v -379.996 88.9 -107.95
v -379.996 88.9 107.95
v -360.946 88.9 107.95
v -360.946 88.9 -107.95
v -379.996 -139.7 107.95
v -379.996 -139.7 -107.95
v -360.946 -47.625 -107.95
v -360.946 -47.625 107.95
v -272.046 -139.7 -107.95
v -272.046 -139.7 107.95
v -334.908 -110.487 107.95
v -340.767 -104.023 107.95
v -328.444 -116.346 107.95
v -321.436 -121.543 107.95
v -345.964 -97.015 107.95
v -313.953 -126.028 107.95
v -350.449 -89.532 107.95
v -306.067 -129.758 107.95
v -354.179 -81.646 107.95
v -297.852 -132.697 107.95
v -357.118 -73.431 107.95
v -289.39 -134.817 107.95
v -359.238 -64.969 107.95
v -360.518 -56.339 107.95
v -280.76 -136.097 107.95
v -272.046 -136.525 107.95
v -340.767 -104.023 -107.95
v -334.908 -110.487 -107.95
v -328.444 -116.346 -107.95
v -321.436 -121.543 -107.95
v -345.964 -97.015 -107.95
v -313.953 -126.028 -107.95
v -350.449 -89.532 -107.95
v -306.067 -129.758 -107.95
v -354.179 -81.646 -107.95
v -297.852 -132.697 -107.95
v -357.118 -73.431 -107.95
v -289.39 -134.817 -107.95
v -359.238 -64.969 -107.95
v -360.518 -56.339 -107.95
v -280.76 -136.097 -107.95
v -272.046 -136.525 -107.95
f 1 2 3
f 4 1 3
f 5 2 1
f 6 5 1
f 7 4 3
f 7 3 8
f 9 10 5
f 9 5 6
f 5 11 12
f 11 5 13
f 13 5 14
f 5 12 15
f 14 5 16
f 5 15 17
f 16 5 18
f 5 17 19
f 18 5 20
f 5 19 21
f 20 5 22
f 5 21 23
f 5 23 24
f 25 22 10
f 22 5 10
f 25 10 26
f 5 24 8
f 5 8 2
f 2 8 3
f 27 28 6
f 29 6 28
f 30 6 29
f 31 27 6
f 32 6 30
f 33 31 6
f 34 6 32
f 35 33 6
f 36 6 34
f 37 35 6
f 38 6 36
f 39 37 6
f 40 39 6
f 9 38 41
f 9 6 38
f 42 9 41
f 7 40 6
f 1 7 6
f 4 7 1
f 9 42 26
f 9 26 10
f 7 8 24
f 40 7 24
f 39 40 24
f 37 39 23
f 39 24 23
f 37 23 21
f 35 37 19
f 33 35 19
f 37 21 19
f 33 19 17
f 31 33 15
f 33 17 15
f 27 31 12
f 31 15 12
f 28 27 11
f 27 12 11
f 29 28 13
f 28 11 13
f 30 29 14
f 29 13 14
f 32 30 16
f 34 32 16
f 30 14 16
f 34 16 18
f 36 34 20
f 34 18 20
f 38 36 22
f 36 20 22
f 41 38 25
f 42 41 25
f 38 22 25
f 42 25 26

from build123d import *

# Parameters (mm, degrees)
SKETCH1_W           = 215.9
SKETCH1_H           = 279.4
BOSS_EXTRUDE1_DEPTH = 63.5
CUT_EXTRUDE2_DEPTH  = 216.9


with BuildPart() as part:
    # Sketch1 → Boss-Extrude1 (new body, symmetric)
    with BuildSketch(Plane(origin=(-316.495998982, -92.239904424, -225.371199256), x_dir=(0, 0, -1), z_dir=(1, 0, 0))):
        with Locations((-225.371199256, 92.239904424)):
            Rectangle(SKETCH1_W, SKETCH1_H)
    extrude(amount=BOSS_EXTRUDE1_DEPTH, both=True)

    # Sketch2 → Cut-Extrude2 (cut, through all)
    with BuildSketch(Plane.XY.offset(107.95)):
        with BuildLine():
            Line((-272.045998982, -139.7), (-252.995998982, -139.7))
            Line((-252.995998982, -139.7), (-252.995998982, 139.7))
            Line((-252.995998982, 139.7), (-379.995998982, 139.7))
            Line((-379.995998982, 139.7), (-379.995998982, 88.9))
            Line((-379.995998982, 88.9), (-360.945998982, 88.9))
            Line((-360.945998982, 88.9), (-360.945998982, -47.625))
            ThreePointArc((-360.945998982, -47.625), (-334.90779183, -110.486792847), (-272.045998982, -136.525))
            Line((-272.045998982, -136.525), (-272.045998982, -139.7))
        make_face()
    extrude(amount=-CUT_EXTRUDE2_DEPTH, mode=Mode.SUBTRACT)


solid = part.part
